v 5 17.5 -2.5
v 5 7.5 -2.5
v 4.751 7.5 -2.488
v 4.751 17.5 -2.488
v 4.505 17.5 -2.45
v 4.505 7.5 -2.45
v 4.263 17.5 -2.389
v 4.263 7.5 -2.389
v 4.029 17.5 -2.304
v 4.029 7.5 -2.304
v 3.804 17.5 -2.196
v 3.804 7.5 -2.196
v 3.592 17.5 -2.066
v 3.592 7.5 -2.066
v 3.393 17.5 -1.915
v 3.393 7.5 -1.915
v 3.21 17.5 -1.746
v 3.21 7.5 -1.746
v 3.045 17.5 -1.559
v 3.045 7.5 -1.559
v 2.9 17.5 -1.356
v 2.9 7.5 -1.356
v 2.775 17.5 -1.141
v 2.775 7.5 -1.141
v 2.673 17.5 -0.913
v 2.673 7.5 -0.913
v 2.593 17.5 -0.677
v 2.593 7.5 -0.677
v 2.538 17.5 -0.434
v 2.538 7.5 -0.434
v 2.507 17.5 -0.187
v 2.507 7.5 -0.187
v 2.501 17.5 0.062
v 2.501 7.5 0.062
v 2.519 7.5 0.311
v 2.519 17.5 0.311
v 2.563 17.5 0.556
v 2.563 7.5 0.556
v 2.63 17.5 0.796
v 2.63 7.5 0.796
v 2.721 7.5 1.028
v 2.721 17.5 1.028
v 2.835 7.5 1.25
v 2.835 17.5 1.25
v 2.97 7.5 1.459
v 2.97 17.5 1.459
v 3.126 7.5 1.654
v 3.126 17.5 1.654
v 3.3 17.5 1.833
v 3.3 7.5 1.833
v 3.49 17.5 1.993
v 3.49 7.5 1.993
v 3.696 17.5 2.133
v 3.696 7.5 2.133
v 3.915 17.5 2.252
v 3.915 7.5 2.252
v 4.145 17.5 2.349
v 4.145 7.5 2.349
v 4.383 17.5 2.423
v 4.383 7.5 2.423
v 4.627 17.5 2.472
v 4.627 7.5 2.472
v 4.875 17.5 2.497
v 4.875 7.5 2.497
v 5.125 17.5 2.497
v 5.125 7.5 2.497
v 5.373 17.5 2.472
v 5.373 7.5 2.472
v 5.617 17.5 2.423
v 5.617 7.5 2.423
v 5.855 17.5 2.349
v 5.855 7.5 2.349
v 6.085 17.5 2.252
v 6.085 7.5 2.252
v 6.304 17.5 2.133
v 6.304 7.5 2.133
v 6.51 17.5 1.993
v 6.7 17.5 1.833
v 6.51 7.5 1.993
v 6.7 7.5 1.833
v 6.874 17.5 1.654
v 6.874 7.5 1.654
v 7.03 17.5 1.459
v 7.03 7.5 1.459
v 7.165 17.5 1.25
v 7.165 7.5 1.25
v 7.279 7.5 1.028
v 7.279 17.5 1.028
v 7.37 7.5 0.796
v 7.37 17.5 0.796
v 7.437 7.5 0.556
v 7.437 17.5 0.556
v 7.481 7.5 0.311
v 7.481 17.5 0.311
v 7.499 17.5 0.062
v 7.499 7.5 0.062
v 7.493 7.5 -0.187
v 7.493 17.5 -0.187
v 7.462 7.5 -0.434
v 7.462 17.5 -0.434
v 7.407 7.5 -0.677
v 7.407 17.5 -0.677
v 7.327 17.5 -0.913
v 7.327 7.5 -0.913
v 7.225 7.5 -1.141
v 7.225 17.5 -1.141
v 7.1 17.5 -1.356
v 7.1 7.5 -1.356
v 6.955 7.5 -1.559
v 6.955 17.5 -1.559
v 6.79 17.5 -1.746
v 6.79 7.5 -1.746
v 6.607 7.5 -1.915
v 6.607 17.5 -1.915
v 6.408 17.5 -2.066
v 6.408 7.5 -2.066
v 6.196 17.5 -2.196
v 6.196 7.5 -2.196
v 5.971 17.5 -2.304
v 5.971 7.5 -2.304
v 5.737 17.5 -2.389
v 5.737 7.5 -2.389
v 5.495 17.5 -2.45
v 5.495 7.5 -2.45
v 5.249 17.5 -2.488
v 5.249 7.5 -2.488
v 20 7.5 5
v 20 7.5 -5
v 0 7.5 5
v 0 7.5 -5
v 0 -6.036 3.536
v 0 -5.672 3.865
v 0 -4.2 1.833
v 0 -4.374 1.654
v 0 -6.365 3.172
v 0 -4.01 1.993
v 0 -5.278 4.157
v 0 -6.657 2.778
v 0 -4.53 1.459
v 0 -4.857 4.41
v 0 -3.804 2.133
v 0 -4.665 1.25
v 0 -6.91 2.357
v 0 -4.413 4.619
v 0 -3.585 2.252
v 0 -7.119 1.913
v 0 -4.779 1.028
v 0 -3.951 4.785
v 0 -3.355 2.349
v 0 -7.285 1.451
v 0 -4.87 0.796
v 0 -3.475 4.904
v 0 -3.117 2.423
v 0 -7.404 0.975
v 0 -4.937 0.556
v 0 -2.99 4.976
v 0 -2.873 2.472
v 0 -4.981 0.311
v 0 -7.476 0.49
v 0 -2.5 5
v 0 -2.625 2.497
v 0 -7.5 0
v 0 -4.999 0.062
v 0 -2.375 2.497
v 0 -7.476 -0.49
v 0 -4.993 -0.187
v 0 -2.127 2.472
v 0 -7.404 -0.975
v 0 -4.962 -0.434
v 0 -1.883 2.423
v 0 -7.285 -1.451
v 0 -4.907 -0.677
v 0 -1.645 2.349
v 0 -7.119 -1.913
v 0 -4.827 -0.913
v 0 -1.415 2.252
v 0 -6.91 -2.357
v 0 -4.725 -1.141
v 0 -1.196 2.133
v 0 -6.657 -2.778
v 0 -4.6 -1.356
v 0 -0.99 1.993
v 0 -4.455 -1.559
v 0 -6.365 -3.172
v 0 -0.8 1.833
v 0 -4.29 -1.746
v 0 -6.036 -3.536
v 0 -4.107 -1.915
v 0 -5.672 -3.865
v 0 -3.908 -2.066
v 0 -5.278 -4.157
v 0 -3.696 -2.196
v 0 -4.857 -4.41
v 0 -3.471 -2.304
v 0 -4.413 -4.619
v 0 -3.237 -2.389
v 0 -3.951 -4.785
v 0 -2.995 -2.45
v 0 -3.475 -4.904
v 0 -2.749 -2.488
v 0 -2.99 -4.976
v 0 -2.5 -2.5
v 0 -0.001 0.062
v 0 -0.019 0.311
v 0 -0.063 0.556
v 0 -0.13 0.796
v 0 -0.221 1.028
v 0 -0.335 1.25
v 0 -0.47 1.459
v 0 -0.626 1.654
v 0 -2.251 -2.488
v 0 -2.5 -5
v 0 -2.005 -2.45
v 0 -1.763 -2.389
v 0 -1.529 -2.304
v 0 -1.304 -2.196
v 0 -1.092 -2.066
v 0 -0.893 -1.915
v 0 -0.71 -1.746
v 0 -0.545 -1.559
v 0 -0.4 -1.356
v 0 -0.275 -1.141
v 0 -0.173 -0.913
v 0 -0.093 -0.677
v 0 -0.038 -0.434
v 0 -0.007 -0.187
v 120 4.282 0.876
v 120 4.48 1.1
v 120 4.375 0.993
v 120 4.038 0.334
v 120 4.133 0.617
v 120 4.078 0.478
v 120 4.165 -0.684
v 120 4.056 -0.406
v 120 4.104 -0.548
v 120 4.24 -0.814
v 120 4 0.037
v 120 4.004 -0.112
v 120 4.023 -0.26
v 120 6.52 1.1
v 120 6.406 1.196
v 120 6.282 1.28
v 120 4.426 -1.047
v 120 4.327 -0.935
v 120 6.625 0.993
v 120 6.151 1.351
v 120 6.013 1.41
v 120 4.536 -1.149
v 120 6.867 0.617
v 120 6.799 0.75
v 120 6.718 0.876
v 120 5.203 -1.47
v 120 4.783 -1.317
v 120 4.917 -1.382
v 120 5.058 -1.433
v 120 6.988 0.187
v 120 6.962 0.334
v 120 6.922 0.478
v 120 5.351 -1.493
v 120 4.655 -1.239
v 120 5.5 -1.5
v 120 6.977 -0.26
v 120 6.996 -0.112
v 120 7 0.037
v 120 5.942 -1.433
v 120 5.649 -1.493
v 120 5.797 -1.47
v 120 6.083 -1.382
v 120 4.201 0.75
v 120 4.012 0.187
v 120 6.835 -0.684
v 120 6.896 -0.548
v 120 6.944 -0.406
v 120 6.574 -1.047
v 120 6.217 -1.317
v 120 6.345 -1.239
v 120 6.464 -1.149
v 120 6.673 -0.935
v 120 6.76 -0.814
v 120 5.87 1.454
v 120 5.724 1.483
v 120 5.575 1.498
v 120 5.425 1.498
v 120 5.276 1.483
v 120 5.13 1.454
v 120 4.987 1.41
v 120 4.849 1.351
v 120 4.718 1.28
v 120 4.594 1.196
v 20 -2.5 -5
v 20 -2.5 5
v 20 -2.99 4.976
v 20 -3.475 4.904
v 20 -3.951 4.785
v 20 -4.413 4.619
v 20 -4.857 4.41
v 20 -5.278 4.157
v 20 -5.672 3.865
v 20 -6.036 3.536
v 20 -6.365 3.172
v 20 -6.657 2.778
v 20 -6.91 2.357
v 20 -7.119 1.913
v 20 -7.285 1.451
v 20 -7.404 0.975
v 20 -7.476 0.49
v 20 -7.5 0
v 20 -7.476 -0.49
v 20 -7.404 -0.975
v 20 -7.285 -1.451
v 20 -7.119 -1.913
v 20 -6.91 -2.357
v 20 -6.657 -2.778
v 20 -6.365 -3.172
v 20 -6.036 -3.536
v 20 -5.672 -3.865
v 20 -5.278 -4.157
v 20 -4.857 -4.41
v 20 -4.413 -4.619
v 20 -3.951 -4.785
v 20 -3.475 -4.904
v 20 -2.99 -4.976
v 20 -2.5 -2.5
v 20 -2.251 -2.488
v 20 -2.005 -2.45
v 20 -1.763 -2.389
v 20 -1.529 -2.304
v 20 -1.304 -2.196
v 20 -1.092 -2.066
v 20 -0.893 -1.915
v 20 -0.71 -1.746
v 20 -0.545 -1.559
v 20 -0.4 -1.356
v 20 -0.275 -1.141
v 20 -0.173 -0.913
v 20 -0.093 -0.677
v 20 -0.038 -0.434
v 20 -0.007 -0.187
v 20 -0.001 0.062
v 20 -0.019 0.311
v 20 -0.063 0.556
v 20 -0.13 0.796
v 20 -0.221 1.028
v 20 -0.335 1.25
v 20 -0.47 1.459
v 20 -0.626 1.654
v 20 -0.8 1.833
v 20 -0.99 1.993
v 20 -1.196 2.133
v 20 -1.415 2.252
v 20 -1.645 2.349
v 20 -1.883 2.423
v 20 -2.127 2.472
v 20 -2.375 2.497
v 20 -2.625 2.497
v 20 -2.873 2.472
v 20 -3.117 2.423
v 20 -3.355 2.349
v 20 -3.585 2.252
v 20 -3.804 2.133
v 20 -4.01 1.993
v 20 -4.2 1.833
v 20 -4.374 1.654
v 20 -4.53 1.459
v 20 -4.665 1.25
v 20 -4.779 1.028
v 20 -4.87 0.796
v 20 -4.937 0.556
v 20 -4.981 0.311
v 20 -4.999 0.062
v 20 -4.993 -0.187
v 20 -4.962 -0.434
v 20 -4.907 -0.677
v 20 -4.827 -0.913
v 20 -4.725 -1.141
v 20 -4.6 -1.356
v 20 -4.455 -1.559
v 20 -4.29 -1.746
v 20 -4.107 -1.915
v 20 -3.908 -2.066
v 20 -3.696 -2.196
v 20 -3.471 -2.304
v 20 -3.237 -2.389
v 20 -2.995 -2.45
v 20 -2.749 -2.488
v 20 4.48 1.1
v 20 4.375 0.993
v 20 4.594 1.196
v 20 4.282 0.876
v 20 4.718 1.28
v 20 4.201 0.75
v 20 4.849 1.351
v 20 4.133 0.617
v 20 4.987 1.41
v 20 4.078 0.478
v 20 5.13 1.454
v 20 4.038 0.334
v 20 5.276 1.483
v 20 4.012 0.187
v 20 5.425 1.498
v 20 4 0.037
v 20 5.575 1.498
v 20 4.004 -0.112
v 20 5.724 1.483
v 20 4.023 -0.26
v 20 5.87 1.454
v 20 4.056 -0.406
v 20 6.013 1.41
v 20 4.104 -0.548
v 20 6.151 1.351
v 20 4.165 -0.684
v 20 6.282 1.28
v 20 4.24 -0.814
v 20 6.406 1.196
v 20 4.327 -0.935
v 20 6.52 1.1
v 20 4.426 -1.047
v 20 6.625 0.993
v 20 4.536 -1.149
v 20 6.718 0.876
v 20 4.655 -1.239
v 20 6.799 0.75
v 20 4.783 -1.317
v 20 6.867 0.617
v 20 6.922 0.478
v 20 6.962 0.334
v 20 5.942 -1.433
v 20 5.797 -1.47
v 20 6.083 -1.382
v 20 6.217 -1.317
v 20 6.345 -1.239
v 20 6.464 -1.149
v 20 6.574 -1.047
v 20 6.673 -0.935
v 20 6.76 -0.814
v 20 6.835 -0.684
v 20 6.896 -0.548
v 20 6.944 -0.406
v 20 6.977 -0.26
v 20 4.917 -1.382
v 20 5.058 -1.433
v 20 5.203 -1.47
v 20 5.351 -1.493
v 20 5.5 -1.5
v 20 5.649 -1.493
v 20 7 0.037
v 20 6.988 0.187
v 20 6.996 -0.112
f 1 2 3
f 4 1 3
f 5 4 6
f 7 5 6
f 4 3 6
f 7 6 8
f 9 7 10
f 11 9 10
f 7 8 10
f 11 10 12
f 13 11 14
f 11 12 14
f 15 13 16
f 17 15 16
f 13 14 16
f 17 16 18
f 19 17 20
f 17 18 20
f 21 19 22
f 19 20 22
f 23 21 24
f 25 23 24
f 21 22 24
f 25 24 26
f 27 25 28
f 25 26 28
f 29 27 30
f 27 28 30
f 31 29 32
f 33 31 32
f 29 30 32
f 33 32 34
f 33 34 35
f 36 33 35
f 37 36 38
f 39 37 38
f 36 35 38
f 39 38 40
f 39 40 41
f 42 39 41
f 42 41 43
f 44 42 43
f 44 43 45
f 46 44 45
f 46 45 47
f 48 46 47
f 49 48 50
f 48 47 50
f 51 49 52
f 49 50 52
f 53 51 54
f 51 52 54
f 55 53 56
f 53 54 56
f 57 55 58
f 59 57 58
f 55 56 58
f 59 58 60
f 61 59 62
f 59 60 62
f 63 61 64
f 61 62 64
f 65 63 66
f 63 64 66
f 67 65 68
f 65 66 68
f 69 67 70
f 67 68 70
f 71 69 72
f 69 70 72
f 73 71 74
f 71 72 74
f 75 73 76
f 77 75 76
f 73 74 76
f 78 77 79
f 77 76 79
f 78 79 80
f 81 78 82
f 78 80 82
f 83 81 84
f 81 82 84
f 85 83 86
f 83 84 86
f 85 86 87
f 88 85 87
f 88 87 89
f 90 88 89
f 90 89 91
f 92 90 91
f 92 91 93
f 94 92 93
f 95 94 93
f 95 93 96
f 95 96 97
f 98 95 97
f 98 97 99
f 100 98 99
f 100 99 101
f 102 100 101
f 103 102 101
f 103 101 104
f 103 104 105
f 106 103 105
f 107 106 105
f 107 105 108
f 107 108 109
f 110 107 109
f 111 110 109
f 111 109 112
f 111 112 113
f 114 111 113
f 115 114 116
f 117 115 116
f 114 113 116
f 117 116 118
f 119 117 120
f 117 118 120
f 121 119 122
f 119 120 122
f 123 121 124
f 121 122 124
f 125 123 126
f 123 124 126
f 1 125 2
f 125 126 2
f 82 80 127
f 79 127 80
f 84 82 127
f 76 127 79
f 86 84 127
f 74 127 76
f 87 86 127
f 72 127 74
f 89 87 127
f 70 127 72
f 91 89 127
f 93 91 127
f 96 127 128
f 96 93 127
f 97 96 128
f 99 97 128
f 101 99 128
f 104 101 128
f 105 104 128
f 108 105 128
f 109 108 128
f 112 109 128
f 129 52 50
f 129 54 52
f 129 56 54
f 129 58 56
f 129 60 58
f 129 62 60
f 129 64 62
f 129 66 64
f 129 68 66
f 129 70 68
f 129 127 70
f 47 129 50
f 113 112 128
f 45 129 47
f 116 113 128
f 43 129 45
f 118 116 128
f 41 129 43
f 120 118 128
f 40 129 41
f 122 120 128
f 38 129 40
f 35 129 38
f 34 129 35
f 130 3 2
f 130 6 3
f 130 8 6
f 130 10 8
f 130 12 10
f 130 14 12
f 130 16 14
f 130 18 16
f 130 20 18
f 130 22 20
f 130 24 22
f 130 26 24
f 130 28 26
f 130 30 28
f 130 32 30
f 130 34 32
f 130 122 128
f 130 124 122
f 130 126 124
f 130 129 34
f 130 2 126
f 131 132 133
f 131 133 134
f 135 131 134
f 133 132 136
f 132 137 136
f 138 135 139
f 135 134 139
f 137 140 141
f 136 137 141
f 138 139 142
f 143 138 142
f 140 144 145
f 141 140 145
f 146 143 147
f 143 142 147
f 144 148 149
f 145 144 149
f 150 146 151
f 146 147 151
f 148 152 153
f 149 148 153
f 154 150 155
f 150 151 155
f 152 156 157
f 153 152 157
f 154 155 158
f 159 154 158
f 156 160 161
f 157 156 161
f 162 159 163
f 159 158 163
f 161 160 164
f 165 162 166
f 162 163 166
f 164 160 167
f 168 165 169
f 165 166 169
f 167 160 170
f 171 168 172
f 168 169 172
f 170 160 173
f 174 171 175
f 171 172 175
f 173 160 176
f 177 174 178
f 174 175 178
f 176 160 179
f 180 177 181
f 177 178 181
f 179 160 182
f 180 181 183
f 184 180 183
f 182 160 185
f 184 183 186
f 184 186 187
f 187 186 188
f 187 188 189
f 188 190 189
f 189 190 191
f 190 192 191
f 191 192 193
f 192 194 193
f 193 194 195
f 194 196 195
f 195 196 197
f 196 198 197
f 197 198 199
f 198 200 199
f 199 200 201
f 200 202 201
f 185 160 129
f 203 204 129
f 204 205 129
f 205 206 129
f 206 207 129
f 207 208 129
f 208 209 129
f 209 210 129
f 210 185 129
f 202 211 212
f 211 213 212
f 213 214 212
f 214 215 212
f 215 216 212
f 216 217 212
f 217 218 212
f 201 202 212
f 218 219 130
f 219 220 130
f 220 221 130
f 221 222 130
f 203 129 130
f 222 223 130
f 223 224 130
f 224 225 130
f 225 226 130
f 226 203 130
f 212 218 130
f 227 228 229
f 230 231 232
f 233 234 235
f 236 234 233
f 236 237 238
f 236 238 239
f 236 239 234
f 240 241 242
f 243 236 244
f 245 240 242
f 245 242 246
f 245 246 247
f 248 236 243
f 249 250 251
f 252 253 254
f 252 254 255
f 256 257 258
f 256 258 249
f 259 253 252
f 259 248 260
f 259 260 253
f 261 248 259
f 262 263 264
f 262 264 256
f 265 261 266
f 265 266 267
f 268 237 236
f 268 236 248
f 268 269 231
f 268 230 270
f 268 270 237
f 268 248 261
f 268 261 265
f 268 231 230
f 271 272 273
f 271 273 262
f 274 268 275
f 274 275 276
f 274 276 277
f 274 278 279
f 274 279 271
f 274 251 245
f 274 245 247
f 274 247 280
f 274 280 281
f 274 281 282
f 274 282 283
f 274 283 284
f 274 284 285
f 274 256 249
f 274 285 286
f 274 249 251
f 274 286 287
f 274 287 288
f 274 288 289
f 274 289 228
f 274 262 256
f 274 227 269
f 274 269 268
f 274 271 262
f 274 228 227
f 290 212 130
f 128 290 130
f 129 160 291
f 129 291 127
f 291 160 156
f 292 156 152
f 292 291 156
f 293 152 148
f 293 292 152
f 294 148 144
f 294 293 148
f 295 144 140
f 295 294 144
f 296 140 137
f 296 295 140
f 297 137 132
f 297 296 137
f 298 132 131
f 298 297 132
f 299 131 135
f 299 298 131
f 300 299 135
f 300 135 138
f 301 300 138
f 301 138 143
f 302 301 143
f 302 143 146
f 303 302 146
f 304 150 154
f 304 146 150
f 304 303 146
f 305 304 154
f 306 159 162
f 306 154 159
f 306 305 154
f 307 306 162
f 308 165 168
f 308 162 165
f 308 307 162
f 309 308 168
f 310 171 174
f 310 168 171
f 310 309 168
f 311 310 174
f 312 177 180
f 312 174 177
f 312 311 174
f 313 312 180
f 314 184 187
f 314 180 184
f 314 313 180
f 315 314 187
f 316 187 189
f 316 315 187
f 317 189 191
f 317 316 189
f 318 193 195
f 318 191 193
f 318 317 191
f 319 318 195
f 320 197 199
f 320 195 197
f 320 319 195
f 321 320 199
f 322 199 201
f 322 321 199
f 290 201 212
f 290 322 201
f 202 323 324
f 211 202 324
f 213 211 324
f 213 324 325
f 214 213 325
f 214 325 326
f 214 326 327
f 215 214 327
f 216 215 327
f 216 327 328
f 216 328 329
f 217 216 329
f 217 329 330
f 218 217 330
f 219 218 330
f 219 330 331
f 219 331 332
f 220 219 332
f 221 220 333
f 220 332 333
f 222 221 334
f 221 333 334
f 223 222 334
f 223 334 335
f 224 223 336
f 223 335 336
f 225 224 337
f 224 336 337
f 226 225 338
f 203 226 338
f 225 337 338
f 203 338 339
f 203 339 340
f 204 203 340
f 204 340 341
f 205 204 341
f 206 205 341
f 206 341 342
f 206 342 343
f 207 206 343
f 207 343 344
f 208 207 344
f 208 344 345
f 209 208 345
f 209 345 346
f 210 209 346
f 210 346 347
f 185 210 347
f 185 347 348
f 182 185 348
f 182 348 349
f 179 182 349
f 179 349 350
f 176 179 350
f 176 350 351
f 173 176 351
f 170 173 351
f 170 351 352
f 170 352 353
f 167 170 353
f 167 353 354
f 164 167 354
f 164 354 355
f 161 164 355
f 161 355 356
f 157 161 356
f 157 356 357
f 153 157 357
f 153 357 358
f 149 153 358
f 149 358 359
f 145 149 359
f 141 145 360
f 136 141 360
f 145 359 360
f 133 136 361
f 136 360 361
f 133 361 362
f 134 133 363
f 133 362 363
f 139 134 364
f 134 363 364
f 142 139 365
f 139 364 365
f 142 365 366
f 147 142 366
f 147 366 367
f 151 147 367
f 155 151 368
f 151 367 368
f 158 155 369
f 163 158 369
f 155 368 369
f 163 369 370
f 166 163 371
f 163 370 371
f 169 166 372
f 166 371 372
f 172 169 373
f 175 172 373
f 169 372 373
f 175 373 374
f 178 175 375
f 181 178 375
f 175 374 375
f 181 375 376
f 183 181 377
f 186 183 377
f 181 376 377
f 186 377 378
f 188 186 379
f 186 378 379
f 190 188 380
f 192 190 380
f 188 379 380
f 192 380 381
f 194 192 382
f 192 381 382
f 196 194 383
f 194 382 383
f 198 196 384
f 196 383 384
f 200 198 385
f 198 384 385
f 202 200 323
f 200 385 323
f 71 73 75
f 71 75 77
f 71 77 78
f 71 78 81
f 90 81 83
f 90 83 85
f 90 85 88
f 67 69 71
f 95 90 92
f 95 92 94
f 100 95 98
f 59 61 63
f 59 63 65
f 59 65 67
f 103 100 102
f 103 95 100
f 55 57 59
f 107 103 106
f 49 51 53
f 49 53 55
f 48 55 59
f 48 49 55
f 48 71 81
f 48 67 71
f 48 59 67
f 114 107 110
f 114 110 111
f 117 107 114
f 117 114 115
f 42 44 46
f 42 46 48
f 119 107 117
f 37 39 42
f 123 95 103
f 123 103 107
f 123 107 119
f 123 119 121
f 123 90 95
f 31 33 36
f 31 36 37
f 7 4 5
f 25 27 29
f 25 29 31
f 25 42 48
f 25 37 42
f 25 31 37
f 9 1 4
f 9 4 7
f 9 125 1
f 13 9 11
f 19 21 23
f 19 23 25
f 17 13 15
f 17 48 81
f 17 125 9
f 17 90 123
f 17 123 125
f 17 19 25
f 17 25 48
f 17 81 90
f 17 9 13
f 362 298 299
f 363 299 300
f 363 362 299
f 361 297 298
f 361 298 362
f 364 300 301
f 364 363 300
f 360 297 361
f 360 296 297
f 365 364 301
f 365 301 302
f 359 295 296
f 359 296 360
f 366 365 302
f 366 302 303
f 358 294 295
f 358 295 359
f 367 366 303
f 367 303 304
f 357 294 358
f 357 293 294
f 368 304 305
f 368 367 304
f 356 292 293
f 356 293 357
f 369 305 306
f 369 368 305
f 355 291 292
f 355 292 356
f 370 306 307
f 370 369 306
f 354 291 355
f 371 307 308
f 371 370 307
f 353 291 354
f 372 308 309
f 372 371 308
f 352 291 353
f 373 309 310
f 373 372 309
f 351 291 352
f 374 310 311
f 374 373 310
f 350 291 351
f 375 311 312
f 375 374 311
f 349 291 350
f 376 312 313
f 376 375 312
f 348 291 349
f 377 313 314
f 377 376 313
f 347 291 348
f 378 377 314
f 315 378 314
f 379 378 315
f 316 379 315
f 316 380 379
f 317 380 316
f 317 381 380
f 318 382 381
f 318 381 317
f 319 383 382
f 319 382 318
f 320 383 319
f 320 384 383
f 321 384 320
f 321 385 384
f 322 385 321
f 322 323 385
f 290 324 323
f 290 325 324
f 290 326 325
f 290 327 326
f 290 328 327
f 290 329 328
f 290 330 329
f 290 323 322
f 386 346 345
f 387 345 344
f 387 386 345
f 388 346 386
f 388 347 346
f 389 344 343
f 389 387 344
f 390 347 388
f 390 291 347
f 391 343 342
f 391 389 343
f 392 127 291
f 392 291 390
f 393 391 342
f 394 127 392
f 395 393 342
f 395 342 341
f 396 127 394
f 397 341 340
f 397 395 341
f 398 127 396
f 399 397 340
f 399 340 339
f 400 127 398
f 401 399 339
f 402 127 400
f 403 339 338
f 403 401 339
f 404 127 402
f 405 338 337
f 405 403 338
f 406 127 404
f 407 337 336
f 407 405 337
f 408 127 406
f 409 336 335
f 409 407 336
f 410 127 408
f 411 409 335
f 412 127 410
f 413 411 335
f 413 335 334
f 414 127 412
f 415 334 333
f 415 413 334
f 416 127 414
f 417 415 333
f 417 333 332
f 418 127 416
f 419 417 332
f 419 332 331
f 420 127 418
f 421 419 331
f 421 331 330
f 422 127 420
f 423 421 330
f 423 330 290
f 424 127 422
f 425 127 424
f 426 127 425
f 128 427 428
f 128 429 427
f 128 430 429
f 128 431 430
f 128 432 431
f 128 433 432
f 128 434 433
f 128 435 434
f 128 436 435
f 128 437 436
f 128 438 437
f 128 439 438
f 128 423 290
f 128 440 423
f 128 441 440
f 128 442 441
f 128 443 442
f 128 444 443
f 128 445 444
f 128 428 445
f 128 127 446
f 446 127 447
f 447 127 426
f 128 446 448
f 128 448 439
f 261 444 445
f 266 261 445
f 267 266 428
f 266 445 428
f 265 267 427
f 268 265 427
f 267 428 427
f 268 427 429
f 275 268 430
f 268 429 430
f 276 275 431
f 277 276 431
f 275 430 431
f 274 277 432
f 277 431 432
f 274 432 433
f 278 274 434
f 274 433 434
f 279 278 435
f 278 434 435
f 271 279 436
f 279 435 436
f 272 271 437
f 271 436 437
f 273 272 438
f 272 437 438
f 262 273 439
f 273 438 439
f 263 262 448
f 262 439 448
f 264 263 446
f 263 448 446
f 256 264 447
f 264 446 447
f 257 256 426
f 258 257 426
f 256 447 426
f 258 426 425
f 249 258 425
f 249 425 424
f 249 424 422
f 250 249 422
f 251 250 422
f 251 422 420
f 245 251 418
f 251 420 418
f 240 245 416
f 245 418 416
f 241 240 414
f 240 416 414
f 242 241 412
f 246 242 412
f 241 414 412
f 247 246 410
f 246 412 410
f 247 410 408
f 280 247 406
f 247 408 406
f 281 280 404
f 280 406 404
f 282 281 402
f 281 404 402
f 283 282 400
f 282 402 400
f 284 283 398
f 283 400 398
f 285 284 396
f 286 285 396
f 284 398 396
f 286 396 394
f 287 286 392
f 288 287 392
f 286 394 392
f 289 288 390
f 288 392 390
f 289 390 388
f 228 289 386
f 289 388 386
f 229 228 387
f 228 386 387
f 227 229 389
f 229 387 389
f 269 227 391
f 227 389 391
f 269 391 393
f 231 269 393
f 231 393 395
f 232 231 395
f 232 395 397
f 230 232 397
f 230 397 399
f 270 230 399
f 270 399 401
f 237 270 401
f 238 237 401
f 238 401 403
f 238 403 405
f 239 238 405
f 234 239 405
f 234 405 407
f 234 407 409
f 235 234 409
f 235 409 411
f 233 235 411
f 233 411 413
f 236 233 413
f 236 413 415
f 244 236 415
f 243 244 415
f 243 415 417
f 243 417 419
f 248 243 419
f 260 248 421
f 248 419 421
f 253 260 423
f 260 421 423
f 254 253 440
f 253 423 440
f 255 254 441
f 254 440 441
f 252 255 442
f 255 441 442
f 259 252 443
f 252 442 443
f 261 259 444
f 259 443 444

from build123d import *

# Parameters (mm, degrees)
SKETCH_1_W          = 10
SKETCH_1_H          = 15
EXTRUDE_1_DEPTH     = 20
FILLET_1_RADIUS     = 5
FILLET_1_LENGTH     = 20
SKETCH_2_R          = 2.5
EXTRUDE_2_DEPTH     = 10
SKETCH_3_R          = 2.5
CUT_EXTRUDE_1_DEPTH = 28.041634566
SKETCH_4_R          = 1.5
EXTRUDE_3_DEPTH     = 100


with BuildPart() as part:
    # 스케치1 → 보스-돌출1 (new body)
    with BuildSketch(Plane(origin=(0, 0, 0), x_dir=(0, 0, -1), z_dir=(1, 0, 0))):
        Rectangle(SKETCH_1_W, SKETCH_1_H)
    extrude(amount=EXTRUDE_1_DEPTH)

    # 필렛1: full round fillet: the end face becomes a half cylinder, R = half its width
    fillet_1_face = Plane((10, -7.5, 0), x_dir=(1, 0, 0), z_dir=(0, -1, 0))  # on the end face: x along it, z out of the body
    fillet_1_slab = fillet_1_face.offset(-FILLET_1_RADIUS / 2) * Box(FILLET_1_LENGTH, 2 * FILLET_1_RADIUS, FILLET_1_RADIUS, mode=Mode.PRIVATE)  # the body's end, R deep
    fillet_1_round = Plane((10, -2.5, 0), x_dir=(0, -1, 0), z_dir=(1, 0, 0)) * Cylinder(FILLET_1_RADIUS, FILLET_1_LENGTH, mode=Mode.PRIVATE)  # its axis R under the face
    add(fillet_1_slab - fillet_1_round, mode=Mode.SUBTRACT)

    # 스케치2 → 보스-돌출2 (add)
    with BuildSketch(Plane(origin=(0, 7.5, 0), x_dir=(1, 0, 0), z_dir=(0, 1, 0))):
        with Locations(Location((5, 0, 0), (0, 0, 90))):
            Circle(SKETCH_2_R)
    extrude(amount=EXTRUDE_2_DEPTH)

    # 스케치3 → 컷-돌출1 (cut, through all)
    with BuildSketch(Plane(origin=(20, 0, 0), x_dir=(0, 0, -1), z_dir=(1, 0, 0))):
        with Locations((0, -2.5)):
            Circle(SKETCH_3_R)
    extrude(amount=-CUT_EXTRUDE_1_DEPTH, mode=Mode.SUBTRACT)

    # 스케치4 → 보스-돌출3 (add)
    with BuildSketch(Plane(origin=(20, 0, 0), x_dir=(0, 0, -1), z_dir=(1, 0, 0))):
        with Locations((0, 5.5)):
            Circle(SKETCH_4_R)
    extrude(amount=EXTRUDE_3_DEPTH)


solid = part.part
